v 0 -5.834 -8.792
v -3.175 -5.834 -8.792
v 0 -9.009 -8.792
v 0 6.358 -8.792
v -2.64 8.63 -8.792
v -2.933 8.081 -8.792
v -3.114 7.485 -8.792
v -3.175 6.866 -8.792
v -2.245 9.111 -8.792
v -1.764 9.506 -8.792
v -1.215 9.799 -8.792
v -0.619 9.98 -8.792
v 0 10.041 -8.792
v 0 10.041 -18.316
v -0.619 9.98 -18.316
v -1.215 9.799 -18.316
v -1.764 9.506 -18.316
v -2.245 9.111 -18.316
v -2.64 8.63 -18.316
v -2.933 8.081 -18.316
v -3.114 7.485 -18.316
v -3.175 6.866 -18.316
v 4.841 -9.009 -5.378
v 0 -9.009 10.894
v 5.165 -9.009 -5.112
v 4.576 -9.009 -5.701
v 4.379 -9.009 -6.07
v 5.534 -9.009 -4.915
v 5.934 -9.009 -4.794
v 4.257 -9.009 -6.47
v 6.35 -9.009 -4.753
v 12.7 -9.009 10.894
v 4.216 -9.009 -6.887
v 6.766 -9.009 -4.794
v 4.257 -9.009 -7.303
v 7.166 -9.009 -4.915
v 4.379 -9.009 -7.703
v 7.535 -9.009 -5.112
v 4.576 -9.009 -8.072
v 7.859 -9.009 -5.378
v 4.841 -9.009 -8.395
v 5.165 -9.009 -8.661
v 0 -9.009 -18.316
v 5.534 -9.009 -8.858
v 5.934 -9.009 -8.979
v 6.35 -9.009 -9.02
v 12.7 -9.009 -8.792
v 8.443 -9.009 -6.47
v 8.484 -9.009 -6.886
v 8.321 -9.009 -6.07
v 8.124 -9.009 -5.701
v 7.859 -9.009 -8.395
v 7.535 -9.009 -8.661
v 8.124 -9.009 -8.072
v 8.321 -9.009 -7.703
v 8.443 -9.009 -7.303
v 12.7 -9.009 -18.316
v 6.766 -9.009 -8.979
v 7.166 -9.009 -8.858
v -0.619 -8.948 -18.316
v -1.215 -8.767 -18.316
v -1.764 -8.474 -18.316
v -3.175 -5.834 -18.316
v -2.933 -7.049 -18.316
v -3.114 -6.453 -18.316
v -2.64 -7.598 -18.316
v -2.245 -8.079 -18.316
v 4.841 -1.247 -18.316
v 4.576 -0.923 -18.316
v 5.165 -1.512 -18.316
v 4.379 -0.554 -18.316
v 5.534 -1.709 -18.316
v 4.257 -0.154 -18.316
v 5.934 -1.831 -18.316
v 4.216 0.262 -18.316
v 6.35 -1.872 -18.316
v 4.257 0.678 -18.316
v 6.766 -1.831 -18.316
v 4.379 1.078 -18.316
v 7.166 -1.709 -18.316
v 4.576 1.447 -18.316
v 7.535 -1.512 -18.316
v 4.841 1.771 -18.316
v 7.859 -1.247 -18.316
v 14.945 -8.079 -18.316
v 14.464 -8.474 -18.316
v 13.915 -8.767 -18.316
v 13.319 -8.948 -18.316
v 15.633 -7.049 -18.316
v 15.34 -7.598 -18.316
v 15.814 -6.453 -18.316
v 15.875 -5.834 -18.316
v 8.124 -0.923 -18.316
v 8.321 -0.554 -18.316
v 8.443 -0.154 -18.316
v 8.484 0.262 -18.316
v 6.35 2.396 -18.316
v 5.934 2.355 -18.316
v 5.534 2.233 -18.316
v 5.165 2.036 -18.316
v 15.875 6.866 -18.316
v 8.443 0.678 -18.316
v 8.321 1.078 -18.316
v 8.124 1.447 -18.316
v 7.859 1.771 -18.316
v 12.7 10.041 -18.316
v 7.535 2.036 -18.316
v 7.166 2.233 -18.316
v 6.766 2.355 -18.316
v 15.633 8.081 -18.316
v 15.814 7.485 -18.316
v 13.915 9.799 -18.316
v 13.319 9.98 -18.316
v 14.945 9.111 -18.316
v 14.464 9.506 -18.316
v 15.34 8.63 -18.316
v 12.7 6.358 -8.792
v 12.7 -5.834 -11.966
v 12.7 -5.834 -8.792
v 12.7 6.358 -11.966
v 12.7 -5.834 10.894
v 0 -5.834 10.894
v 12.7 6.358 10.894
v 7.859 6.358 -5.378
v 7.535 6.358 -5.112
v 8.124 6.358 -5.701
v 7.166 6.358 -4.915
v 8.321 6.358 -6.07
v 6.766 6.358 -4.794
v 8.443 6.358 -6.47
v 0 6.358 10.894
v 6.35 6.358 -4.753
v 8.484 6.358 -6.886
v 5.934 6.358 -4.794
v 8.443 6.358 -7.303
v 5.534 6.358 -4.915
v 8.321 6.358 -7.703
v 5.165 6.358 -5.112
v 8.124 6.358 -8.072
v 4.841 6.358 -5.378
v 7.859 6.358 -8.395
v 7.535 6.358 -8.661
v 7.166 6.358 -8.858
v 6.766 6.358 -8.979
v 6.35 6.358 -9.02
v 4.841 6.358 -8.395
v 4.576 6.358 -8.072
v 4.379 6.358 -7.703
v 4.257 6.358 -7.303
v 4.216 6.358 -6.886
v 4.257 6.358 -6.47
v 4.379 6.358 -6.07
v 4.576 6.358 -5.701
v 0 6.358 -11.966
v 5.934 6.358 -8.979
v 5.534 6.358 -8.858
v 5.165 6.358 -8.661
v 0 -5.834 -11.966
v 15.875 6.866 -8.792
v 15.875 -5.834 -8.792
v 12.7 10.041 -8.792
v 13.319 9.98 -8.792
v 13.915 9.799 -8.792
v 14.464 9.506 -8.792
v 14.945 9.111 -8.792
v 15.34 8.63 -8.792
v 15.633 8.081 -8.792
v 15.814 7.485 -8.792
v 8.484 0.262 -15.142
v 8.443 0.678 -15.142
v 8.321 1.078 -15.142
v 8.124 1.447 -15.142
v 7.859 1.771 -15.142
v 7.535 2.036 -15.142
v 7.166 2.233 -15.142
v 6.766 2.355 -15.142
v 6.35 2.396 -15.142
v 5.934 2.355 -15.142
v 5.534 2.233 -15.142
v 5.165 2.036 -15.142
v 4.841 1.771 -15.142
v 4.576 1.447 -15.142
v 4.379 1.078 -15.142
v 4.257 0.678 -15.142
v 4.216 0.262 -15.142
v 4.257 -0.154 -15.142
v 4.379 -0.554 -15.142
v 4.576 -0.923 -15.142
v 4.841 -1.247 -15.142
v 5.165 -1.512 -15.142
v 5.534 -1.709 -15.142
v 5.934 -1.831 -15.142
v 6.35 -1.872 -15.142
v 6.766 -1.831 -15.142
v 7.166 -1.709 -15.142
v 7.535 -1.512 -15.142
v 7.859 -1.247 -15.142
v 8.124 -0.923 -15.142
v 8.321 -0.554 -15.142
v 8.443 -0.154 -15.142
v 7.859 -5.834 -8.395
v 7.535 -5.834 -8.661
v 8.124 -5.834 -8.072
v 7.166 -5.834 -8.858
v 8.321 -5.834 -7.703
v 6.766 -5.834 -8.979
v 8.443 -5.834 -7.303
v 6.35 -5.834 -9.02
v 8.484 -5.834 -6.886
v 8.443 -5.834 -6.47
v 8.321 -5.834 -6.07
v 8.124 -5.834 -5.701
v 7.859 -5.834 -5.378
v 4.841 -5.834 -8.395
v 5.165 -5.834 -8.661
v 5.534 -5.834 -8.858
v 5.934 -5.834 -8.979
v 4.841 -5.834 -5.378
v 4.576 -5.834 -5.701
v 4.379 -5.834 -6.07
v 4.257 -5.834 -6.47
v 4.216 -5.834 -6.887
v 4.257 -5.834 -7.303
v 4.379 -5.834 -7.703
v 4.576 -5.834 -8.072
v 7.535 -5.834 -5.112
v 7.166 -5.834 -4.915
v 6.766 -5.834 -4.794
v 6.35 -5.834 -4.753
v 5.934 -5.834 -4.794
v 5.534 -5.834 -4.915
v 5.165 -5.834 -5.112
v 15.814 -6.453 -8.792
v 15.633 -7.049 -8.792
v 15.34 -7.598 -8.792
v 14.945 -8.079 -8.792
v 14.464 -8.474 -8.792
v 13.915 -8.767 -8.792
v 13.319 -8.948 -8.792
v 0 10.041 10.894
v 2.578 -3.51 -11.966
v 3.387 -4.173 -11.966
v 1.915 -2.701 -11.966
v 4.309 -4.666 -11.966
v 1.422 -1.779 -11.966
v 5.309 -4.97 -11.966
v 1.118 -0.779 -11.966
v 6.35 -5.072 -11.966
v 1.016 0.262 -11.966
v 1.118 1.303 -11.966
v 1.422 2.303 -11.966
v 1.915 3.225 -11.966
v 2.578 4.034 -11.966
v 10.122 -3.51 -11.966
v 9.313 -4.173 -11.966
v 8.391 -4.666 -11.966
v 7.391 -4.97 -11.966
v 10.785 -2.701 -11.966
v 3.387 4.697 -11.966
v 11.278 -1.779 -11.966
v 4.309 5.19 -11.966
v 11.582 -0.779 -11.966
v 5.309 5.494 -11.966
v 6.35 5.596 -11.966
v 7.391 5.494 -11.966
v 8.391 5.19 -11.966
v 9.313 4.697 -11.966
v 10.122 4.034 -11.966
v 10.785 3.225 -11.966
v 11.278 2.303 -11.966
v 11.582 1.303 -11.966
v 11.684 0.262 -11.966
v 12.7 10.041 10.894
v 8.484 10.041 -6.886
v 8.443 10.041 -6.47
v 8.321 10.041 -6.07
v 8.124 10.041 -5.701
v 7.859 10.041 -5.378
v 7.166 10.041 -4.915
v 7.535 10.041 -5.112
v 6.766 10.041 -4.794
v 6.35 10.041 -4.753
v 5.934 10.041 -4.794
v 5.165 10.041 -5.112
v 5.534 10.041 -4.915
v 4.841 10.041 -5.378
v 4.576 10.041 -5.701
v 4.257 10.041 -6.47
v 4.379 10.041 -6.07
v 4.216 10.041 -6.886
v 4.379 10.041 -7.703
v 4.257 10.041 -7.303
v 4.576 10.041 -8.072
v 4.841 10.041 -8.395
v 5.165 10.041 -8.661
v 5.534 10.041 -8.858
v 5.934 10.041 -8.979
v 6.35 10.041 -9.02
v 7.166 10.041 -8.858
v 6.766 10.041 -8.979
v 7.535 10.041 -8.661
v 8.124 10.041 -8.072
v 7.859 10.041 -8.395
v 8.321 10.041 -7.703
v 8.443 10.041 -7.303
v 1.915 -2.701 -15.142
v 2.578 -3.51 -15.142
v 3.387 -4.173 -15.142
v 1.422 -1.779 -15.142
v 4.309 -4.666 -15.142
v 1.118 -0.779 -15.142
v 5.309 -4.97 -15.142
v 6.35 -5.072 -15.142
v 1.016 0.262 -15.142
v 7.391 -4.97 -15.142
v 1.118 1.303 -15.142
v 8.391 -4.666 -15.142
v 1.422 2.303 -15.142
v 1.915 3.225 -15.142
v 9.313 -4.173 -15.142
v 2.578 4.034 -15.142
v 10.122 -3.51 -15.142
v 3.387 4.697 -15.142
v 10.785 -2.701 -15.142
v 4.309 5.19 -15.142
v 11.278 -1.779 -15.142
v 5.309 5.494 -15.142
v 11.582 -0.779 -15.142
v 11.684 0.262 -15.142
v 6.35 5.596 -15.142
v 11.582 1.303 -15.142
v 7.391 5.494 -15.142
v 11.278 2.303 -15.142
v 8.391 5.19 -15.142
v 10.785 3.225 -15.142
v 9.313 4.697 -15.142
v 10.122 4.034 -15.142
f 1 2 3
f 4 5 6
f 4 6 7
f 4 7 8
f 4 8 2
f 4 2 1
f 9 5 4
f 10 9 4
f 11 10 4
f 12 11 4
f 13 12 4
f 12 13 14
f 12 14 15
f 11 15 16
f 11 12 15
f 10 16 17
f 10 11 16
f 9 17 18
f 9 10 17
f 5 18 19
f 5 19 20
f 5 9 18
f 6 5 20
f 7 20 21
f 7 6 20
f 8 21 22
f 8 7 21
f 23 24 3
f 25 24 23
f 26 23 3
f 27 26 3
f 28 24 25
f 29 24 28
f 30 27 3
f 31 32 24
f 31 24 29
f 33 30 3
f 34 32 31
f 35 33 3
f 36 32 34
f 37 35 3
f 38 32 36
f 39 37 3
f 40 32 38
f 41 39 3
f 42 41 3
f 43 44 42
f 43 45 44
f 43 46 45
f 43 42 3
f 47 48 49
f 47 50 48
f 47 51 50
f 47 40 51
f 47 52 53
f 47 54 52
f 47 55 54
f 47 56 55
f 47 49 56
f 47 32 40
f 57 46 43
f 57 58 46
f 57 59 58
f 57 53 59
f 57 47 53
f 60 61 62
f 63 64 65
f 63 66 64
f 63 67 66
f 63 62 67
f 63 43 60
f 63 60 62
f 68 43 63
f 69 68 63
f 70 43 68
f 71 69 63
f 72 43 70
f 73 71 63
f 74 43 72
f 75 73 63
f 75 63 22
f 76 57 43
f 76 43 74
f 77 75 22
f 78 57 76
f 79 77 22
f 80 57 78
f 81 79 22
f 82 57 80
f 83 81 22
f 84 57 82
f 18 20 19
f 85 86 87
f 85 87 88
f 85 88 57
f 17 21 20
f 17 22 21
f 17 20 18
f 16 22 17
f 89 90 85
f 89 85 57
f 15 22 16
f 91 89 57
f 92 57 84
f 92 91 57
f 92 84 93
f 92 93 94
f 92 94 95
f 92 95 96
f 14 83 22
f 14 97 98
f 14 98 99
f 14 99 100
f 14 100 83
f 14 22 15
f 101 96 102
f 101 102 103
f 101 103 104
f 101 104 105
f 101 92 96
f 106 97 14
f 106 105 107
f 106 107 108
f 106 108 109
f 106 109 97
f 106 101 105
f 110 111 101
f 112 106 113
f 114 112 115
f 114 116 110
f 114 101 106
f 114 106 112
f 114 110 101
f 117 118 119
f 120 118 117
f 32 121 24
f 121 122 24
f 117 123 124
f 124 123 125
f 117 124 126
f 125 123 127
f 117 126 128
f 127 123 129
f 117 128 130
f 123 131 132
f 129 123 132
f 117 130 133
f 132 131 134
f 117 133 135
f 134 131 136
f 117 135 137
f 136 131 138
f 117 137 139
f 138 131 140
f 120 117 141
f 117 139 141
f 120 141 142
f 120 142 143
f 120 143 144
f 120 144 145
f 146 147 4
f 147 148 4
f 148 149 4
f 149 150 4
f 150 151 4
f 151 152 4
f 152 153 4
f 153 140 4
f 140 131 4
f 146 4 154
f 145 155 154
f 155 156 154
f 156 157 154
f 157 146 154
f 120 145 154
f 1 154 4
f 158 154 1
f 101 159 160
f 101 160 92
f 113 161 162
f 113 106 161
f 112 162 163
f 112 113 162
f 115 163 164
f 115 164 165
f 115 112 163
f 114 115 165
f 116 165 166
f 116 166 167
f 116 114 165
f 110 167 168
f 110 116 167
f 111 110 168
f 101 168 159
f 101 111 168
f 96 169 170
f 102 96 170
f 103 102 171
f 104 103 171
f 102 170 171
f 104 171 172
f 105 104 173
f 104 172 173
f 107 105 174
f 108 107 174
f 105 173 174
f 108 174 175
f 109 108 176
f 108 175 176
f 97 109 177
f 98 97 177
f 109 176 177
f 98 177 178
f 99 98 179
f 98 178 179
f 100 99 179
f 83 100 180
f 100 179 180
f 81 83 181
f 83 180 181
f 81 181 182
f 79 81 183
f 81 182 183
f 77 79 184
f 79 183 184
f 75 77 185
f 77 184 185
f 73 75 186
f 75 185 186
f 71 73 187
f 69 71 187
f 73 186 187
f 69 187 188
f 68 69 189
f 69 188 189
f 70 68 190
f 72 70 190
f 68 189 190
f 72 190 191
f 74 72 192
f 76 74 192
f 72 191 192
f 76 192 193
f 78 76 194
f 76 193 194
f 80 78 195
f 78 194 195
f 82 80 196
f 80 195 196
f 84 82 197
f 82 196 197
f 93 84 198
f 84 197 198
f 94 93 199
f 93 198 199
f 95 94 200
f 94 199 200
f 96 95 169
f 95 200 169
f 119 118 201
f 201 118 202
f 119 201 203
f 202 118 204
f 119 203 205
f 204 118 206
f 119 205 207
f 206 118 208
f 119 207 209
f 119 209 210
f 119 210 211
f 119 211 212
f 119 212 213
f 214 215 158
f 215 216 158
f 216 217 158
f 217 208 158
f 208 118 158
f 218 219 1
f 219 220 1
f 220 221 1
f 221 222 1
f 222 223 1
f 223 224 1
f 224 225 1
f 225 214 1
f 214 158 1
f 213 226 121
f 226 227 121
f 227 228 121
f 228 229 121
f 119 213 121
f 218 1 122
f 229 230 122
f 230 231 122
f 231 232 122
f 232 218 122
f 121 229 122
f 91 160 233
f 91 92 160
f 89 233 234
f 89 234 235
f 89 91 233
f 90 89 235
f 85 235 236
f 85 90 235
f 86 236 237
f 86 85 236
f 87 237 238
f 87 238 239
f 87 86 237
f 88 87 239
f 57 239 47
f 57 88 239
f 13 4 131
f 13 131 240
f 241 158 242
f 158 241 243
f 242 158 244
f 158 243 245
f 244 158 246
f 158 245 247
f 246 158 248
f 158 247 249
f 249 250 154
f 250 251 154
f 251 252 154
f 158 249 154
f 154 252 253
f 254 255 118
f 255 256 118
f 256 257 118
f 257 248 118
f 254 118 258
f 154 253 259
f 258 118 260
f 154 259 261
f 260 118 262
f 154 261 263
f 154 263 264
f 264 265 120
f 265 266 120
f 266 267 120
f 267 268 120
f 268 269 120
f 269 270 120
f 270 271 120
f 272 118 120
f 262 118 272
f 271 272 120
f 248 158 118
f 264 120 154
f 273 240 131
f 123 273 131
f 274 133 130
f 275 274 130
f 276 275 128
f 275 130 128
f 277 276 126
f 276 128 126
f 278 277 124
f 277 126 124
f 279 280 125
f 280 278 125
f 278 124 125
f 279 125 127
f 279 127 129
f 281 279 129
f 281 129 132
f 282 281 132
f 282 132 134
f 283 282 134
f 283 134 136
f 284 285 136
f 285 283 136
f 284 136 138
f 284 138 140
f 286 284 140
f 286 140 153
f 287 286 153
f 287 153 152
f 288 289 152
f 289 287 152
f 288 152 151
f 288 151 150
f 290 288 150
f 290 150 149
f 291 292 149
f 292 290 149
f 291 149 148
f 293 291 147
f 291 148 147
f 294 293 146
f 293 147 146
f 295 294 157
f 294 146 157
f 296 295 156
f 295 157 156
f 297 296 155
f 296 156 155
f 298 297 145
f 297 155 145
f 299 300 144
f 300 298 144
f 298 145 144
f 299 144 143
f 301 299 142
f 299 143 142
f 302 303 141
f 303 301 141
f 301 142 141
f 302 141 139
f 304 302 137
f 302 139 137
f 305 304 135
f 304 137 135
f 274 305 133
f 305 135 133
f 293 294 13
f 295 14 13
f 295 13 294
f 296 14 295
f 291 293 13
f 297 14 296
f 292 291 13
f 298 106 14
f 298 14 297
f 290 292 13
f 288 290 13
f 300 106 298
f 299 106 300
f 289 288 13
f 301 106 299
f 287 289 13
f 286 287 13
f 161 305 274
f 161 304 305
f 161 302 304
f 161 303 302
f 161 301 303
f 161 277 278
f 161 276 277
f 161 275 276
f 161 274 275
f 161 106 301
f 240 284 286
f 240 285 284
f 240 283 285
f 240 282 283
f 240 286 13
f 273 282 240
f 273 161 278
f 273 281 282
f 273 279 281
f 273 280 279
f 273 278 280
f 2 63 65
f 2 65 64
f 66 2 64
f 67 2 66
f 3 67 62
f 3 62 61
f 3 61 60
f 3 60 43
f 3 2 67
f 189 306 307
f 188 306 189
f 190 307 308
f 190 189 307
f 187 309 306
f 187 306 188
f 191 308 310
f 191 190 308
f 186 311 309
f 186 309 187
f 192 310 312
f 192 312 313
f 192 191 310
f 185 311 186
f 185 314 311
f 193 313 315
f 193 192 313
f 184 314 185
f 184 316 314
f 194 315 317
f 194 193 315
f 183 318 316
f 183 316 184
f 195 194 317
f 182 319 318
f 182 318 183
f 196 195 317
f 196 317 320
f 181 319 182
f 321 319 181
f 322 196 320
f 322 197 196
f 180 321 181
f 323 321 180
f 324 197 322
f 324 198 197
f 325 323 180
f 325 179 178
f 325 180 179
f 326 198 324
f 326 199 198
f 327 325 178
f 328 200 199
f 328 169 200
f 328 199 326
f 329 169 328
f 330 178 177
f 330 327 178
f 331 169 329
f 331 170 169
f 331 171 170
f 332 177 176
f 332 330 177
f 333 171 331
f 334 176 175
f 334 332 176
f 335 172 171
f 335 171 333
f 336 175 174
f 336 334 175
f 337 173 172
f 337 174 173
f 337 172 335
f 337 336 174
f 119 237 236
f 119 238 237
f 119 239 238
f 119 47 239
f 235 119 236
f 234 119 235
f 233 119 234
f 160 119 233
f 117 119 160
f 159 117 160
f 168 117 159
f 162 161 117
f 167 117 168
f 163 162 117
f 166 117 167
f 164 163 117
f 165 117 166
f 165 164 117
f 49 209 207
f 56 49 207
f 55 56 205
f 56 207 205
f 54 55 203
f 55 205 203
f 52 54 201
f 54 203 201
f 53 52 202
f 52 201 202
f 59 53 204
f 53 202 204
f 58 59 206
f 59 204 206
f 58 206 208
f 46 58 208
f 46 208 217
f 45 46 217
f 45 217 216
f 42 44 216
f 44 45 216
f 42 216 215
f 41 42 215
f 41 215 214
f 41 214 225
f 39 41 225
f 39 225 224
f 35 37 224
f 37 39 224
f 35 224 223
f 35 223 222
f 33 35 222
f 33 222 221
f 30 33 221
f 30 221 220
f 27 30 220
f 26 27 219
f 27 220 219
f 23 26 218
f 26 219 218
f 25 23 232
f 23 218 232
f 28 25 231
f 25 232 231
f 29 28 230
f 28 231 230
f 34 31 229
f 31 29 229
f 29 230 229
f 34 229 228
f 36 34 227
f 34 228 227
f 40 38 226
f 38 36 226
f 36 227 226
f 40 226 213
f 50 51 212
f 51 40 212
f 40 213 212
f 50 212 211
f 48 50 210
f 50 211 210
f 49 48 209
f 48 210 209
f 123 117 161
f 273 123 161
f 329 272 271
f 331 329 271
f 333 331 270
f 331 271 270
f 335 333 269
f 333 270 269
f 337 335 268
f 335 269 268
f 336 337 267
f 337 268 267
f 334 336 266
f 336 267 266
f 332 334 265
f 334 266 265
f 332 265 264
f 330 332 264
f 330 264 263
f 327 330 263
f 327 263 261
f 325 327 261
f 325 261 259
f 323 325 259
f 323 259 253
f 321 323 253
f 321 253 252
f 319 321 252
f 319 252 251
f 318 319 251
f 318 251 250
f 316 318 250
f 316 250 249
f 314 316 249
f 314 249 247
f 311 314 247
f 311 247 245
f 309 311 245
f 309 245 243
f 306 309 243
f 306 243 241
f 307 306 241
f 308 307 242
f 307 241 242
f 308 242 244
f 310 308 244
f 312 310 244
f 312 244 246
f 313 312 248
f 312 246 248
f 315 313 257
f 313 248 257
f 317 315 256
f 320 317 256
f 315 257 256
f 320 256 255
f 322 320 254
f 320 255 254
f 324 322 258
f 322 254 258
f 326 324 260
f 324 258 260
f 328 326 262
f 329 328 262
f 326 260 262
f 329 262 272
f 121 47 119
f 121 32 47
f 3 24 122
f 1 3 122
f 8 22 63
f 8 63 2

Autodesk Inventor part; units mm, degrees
ref_plane "YZ Plane" through (0, 0, 0) normal (1, 0, 0) x (0, 1, 0)
ref_plane "XZ Plane" through (0, 0, 0) normal (0, 1, 0) x (-1, 0, 0)
ref_plane "XY Plane" through (0, 0, 0) normal (0, 0, 1) x (1, 0, 0)
sketch "Sketch1" plane through (0, 0, 0) normal (1, 0, 0) x (0, 1, 0)
  line L0 (-5.834, -11.9665) -> (6.358, -11.9665)
  line L1 (6.358, -11.9665) -> (9.533, -11.9665)
  line L2 (-5.834, -11.9665) -> (-9.009, -11.9665)
  line L3 (6.358, -11.9665) -> (10.041, -11.9665)
  line L4 (10.041, -11.9665) -> (10.041, 10.8935)
  line L5 (10.041, 10.8935) -> (6.358, 10.8935)
  line L6 (6.358, 10.8935) -> (6.358, -11.9665)
  line L7 (-9.009, -11.9665) -> (-5.834, -11.9665)
  line L8 (-5.834, -11.9665) -> (-5.834, 10.8935)
  line L9 (-5.834, 10.8935) -> (-9.009, 10.8935)
  line L10 (-9.009, 10.8935) -> (-9.009, -11.9665)
  line L11 (10.041, -11.9665) -> (-9.009, -11.9665)
  line L12 (-9.009, -11.9665) -> (-9.009, -18.3165)
  line L13 (-9.009, -18.3165) -> (10.041, -18.3165)
  line L14 (10.041, -18.3165) -> (10.041, -11.9665)
  point P0 (0, 0)
  dimension "d0" = 12.192
  dimension "d1" = 3.175
  dimension "d2" = 3.175
  dimension "d3" = 22.86
extrude "Extrusion1" add sketch "Sketch1" along normal blind 12.7
sketch "Sketch2" plane through (0, -5.834, 10.8935) normal (0, 1, 0) x (1, 0, 0)
  line L0 (0, 22.86) -> (12.7, 22.86) projected
  line L1 (12.7, 22.86) -> (0, 22.86)
  line L2 (6.35, 22.86) -> (6.35, 17.78)
  circle A0 centre (6.35, 17.78) radius 2.1336
  point P0 (0, 10.8935)
  dimension "d6" = 5.08
  dimension "d7" = 4.2672
extrude "Extrusion2" cut sketch "Sketch2" along normal through all both and the other way through all
sketch "Sketch3" plane through (12.7, 0, 0) normal (1, 0, 0) x (0, 0, -1)
  line L0 (18.3165, 10.041) -> (-10.8935, 10.041) projected
  line L1 (11.9665, 6.358) -> (11.9665, -5.834) projected
  line L2 (-10.8935, -9.009) -> (18.3165, -9.009) projected
  line L3 (18.3165, -9.009) -> (18.3165, 10.041) projected
  line L4 (18.3165, 10.041) -> (11.9665, 10.041)
  line L5 (11.9665, 10.041) -> (11.9665, -9.009)
  line L6 (11.9665, -9.009) -> (18.3165, -9.009)
  line L7 (18.3165, -9.009) -> (18.3165, 10.041)
  point P0 (0, 0)
  point P1 (11.9665, -5.834)
  point P2 (11.9665, 6.358)
extrude "Extrusion3" add sketch "Sketch3" along normal blind 3.175
sketch "Sketch4" plane through (0, 0, 0) normal (-1, 0, 0) x (0, 0, 1)
  line L0 (-18.3165, 10.041) -> (10.8935, 10.041) projected
  line L1 (-18.3165, -9.009) -> (-18.3165, 10.041) projected
  line L2 (10.8935, -9.009) -> (-18.3165, -9.009) projected
  line L3 (-11.9665, 6.358) -> (-11.9665, -5.834) projected
  line L4 (-11.9665, 6.358) -> (-11.9665, 10.041) projected
  line L5 (-18.3165, -9.009) -> (-11.9665, -9.009)
  line L6 (-11.9665, -9.009) -> (-11.9665, 10.041)
  line L7 (-11.9665, 10.041) -> (-18.3165, 10.041)
  line L8 (-18.3165, 10.041) -> (-18.3165, -9.009)
  point P0 (0, 0)
extrude "Extrusion4" add sketch "Sketch4" along normal blind 3.175
sketch "Sketch5" plane through (0, -5.834, -11.9665) normal (0, 0, 1) x (1, 0, 0)
  line L0 (12.7, -3.175) -> (12.7, 0) projected
  line L1 (12.7, -3.175) -> (15.875, -3.175) projected
  line L2 (15.875, 15.875) -> (15.875, -3.175) projected
  line L3 (12.7, 15.875) -> (15.875, 15.875) projected
  line L4 (12.7, 12.192) -> (12.7, 15.875) projected
  line L5 (0, 15.875) -> (0, 12.192) projected
  line L6 (0, 15.875) -> (-3.175, 15.875) projected
  line L7 (-3.175, -3.175) -> (-3.175, 15.875) projected
  line L8 (0, -3.175) -> (-3.175, -3.175) projected
  line L9 (0, 0) -> (0, -3.175) projected
  line L10 (-3.175, 15.875) -> (0, 15.875)
  line L11 (0, 15.875) -> (0, -3.175)
  line L12 (0, -3.175) -> (-3.175, -3.175)
  line L13 (-3.175, -3.175) -> (-3.175, 15.875)
  line L14 (12.7, -3.175) -> (15.875, -3.175)
  line L15 (15.875, -3.175) -> (15.875, 15.875)
  line L16 (15.875, 15.875) -> (12.7, 15.875)
  line L17 (12.7, 15.875) -> (12.7, -3.175)
  point P0 (0, 5.834)
extrude "Extrusion5" add sketch "Sketch5" along normal blind 3.175
sketch "Sketch6" plane through (0, 6.358, -11.9665) normal (0, 0, 1) x (1, 0, 0)
  line L0 (0, 0) -> (12.7, 0) projected
  line L1 (0, -12.192) -> (12.7, -12.192) projected
  line L2 (6.35, 0) -> (6.35, -12.192)
  circle A0 centre (6.35, -6.096) radius 5.334
  point P0 (0, -6.358)
  dimension "d16" = 10.668
extrude "Extrusion6" cut sketch "Sketch6" against normal blind 3.175
sketch "Sketch7" plane through (6.35, 0.262, -15.1415) normal (0, 0, 1) x (1, 0, 0)
  circle A0 centre (0, 0) radius 5.334 projected
  circle A1 centre (0, 0) radius 2.1336
  point P0 (-6.35, -0.262)
  dimension "d19" = 4.2672
extrude "Extrusion7" cut sketch "Sketch7" against normal through all contours A1
fillet "Fillet1" radius 3.175 4 edges at (15.875, -9.009, -13.554) (15.875, 10.041, -13.554) (-3.175, 10.041, -13.554) (-3.175, -9.009, -13.554)
properties part number "pto piston part"
